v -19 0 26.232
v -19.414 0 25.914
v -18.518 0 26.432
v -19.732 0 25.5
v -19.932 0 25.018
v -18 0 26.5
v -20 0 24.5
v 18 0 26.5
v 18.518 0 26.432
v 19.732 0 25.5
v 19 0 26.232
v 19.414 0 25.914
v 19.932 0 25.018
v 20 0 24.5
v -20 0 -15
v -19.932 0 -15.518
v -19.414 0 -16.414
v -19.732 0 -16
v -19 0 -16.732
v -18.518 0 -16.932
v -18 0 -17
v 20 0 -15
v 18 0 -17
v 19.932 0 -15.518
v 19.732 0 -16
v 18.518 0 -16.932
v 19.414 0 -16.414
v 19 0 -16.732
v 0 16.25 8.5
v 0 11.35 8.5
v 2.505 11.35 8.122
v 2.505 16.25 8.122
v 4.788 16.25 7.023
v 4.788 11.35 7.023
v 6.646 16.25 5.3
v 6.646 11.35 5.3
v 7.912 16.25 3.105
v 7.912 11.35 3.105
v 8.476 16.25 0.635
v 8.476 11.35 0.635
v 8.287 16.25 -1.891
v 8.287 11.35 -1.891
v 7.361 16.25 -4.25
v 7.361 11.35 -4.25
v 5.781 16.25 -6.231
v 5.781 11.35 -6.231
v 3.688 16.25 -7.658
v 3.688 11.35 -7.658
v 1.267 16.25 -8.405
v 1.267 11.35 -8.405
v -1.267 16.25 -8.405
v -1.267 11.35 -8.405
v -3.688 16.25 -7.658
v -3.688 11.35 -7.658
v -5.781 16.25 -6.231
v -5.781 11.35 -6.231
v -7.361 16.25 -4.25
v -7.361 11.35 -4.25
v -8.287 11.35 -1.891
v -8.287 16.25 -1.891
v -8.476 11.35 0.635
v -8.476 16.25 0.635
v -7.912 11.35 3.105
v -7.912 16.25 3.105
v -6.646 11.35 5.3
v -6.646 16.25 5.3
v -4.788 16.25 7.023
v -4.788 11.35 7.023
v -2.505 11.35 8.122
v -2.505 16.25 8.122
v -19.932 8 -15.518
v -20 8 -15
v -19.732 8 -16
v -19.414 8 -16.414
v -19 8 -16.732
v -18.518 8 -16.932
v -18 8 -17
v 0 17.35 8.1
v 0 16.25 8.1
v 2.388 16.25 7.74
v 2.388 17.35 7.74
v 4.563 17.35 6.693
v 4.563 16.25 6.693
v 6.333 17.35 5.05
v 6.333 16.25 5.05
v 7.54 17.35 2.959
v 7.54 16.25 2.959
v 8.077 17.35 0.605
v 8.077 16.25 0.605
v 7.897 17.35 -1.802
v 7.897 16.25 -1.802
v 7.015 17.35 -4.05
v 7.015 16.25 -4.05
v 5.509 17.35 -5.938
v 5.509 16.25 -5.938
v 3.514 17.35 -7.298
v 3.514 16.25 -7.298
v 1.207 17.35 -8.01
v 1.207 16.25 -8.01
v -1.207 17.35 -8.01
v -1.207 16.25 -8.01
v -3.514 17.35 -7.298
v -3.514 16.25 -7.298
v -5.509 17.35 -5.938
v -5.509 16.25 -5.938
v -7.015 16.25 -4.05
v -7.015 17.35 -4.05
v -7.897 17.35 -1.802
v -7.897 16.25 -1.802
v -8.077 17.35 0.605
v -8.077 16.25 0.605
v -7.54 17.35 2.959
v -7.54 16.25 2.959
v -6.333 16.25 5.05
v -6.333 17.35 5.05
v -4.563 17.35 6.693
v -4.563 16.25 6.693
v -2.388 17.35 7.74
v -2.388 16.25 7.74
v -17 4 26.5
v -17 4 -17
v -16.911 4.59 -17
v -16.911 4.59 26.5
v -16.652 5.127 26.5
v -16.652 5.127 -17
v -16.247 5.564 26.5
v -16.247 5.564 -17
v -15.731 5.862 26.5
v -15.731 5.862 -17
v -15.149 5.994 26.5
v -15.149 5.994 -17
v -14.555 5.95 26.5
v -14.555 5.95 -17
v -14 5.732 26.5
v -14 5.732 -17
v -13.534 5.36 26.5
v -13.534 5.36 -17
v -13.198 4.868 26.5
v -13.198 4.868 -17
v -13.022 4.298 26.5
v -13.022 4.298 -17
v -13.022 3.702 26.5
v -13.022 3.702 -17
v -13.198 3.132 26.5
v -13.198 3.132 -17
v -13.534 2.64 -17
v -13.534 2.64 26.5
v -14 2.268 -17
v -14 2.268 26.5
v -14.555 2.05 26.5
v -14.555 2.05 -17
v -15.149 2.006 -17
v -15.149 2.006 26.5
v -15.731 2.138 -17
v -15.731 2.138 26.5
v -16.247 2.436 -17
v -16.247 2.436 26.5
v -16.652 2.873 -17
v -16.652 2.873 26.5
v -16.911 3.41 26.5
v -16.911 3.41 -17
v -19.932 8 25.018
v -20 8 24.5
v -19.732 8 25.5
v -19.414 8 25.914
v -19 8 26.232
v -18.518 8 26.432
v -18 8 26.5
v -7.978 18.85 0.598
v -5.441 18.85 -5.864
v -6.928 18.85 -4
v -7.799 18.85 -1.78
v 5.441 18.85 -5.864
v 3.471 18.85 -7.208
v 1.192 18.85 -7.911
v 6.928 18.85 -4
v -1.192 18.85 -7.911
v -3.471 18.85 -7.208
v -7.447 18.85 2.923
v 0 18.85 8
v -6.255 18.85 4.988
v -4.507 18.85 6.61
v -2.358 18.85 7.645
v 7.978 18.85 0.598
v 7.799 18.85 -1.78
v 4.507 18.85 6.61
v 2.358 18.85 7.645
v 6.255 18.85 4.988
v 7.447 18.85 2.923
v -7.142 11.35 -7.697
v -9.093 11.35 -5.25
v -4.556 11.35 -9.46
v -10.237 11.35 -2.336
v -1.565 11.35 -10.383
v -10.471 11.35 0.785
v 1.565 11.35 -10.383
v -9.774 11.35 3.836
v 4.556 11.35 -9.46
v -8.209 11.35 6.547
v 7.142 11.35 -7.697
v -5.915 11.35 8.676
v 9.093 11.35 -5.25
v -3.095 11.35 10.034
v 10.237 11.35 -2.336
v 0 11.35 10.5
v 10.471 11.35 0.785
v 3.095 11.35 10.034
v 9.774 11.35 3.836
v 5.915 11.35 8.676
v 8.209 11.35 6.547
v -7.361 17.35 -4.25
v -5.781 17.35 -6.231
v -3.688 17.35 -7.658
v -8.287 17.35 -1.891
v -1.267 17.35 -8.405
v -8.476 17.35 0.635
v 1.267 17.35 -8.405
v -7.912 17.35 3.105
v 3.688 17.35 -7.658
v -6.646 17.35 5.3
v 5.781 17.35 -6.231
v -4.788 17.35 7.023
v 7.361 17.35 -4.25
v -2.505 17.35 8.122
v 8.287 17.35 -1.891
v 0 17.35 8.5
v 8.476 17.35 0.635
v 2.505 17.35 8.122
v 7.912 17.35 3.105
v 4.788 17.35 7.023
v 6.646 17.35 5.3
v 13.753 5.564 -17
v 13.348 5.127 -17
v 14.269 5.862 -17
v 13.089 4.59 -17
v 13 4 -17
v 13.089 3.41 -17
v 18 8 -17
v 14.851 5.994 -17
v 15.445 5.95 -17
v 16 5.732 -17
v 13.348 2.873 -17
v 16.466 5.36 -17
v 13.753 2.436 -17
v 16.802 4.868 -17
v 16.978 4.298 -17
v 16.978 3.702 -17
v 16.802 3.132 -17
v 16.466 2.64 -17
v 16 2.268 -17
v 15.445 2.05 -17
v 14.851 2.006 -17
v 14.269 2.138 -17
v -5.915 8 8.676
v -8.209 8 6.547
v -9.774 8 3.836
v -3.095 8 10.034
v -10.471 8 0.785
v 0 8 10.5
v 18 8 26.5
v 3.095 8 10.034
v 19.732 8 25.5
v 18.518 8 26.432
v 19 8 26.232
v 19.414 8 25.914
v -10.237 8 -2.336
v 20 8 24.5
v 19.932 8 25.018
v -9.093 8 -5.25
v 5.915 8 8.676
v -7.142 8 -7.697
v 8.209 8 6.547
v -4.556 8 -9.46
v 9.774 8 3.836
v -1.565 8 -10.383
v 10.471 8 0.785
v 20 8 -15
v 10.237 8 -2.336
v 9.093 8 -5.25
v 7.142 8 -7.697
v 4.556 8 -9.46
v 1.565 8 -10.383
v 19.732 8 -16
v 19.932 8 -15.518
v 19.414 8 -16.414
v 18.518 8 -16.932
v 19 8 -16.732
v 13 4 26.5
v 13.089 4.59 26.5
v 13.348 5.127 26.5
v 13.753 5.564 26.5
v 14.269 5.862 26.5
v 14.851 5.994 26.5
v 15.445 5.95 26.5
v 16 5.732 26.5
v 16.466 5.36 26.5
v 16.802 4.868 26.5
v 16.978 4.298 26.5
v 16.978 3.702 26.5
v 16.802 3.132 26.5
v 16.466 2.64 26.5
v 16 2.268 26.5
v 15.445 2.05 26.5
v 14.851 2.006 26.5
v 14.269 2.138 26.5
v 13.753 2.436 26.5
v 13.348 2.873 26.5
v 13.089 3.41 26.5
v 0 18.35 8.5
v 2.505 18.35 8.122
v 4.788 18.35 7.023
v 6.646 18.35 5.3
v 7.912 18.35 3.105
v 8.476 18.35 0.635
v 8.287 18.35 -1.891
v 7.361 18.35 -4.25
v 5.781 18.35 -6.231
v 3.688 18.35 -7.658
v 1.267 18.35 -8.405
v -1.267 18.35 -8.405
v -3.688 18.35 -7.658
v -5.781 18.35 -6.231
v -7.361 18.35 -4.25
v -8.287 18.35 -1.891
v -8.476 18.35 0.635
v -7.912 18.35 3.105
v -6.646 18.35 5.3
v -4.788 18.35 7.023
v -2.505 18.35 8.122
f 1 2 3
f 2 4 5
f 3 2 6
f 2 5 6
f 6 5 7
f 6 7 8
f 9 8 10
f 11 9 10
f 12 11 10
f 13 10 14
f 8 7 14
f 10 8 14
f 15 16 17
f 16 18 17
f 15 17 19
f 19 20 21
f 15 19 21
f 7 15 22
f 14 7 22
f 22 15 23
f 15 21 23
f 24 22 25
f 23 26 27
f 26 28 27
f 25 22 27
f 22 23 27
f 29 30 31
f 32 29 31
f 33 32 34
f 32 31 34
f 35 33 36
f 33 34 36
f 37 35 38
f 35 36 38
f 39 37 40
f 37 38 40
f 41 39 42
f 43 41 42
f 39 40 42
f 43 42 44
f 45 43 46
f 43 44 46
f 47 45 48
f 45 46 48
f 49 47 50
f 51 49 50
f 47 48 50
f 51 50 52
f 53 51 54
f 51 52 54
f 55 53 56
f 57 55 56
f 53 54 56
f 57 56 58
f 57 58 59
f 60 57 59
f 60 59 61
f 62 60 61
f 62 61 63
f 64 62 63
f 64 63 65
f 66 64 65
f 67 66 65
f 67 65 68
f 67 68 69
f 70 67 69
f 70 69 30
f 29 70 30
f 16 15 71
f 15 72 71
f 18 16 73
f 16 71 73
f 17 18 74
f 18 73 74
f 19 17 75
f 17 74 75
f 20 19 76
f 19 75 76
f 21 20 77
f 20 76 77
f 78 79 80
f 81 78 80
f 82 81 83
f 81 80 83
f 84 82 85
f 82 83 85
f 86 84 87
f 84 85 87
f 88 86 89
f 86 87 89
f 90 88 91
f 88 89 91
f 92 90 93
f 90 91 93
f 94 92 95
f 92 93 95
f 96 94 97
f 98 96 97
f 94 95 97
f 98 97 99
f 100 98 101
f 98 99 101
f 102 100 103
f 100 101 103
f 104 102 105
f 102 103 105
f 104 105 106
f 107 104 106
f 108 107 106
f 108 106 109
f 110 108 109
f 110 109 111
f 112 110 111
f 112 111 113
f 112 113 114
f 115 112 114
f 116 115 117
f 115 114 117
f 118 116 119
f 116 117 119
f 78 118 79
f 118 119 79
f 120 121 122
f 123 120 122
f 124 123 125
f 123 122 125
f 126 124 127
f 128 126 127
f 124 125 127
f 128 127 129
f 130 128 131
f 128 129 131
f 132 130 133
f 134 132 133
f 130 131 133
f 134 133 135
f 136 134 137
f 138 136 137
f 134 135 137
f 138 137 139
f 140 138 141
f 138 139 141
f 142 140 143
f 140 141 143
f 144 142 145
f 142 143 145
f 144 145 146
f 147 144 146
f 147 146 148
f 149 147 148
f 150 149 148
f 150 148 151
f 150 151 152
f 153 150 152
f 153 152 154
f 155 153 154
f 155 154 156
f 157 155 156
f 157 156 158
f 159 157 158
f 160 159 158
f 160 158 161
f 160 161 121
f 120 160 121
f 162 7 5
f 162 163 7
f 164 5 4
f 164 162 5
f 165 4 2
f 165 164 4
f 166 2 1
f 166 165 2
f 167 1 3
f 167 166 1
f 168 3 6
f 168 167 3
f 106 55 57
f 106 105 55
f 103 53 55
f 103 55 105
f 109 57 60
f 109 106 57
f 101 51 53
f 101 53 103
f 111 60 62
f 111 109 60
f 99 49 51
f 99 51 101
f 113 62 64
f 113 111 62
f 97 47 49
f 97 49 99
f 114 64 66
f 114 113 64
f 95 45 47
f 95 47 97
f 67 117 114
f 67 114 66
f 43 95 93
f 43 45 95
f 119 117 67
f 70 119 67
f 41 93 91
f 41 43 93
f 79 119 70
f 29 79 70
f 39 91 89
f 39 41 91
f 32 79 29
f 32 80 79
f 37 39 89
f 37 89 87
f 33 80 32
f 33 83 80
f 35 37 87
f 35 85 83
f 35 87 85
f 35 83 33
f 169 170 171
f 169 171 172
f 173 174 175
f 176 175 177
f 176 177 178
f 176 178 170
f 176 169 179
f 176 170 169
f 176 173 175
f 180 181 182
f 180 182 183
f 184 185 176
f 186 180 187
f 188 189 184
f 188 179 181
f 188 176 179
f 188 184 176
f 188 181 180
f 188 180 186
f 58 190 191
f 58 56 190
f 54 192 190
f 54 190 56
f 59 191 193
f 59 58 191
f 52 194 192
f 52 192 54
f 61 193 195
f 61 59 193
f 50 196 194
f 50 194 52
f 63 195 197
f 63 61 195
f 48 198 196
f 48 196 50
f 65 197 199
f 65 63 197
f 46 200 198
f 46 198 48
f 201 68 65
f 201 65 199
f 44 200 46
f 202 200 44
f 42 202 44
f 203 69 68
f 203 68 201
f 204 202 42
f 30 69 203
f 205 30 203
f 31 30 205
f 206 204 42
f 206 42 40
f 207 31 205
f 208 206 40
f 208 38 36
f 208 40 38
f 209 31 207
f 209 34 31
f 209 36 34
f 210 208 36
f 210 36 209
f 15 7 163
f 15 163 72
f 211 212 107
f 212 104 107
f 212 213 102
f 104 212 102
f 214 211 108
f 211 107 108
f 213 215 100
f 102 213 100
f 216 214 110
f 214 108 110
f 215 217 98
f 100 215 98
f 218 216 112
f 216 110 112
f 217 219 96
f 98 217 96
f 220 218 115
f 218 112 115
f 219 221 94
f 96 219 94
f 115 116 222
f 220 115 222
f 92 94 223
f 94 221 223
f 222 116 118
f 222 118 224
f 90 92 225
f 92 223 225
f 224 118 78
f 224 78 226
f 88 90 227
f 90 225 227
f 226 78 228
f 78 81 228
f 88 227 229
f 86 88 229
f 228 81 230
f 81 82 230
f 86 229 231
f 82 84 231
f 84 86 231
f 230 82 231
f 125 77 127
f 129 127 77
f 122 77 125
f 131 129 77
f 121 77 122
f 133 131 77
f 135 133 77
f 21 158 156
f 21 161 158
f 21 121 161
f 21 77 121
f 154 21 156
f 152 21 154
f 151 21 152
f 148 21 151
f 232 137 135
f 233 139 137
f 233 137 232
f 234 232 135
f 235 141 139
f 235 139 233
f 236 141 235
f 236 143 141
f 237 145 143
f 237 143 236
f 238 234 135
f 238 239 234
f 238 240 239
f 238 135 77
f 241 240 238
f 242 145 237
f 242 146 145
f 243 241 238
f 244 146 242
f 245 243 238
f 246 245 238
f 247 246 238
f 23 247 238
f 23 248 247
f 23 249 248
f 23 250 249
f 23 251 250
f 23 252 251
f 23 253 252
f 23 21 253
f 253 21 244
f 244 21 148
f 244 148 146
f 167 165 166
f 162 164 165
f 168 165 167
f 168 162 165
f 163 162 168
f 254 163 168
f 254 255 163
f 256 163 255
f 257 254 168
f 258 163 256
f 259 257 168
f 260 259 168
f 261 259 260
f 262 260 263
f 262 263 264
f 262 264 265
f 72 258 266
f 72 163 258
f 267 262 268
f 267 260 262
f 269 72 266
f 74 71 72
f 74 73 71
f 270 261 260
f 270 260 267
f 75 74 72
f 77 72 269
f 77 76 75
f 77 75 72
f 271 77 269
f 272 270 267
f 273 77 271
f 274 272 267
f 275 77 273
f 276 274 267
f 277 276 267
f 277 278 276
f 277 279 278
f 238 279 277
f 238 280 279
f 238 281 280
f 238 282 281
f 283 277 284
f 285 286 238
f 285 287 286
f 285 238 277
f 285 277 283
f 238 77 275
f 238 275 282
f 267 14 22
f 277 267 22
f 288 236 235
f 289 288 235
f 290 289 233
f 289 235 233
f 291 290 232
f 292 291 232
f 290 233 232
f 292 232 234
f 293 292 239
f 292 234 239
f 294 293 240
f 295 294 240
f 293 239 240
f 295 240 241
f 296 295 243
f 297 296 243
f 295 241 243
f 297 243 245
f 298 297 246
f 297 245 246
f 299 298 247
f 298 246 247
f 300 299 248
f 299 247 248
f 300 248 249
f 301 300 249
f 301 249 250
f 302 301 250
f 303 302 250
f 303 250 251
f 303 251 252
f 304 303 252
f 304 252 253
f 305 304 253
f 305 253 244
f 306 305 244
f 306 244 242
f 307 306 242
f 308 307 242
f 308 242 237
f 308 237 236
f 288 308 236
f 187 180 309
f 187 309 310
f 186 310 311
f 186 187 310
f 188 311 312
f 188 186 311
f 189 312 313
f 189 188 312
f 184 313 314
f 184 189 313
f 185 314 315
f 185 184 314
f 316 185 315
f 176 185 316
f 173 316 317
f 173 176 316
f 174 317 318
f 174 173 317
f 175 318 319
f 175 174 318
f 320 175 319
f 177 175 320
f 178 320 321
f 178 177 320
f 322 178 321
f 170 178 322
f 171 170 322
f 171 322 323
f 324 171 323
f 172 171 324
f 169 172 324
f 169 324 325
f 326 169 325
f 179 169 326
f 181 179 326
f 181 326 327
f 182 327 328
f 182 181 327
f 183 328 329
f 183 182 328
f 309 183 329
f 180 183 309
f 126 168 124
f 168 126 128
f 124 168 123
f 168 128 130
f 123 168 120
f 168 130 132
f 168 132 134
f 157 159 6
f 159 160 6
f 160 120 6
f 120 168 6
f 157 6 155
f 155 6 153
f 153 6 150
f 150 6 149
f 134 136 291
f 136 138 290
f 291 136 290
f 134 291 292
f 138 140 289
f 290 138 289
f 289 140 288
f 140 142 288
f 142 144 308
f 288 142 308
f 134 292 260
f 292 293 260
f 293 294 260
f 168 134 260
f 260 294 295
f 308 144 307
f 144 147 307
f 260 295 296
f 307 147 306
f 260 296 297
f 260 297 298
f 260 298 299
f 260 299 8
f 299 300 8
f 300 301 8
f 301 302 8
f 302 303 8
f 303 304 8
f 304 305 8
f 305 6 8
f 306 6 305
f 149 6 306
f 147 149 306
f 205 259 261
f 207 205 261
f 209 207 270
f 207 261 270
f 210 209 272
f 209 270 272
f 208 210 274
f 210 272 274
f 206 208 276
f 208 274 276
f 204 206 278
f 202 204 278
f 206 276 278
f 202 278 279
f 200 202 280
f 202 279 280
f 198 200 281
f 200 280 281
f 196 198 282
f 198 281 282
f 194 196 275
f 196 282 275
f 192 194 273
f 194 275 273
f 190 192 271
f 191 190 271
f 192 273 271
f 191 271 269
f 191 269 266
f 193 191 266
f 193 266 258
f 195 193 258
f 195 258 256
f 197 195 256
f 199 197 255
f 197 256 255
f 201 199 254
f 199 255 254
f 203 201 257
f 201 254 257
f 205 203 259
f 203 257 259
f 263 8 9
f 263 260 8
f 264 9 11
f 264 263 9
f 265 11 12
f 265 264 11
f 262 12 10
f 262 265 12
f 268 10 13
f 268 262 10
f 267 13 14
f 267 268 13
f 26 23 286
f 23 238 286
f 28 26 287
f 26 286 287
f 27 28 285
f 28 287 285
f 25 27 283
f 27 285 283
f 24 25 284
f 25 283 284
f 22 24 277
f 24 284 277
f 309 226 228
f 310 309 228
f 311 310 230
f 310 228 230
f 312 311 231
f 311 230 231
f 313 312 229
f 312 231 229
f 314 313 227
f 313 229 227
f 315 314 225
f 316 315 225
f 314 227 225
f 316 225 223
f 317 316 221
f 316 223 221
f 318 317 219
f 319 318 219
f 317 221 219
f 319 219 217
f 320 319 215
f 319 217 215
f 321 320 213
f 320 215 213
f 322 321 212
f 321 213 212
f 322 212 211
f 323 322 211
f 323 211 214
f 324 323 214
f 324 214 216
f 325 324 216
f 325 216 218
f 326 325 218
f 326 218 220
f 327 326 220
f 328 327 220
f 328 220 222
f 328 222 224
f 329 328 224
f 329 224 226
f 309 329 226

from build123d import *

# Parameters (mm, degrees)
SKETCH_1_W          = 40
SKETCH_1_H          = 43.5
EXTRUDE_1_DEPTH     = 8
SKETCH_2_R          = 10.5
EXTRUDE_2_DEPTH     = 3.35
SKETCH_3_R          = 8.5
EXTRUDE_3_DEPTH     = 7.5
SKETCH_4_R          = 2
CUT_EXTRUDE_1_DEPTH = 52.454567339
CUT_EXTRUDE_START   = -1.1
SKETCH_5_R          = 8.5
SKETCH_5_R_2        = 8.1
CUT_EXTRUDE_2_DEPTH = 1.1
CHAMFER_1_SIZE      = 0.5
FILLET_1_R          = 2


with BuildPart() as part:
    # 草图1 → 凸台-拉伸1 (new body)
    with BuildSketch(Plane(origin=(0, 0, 0), x_dir=(1, 0, 0), z_dir=(0, 1, 0))):
        with Locations((0, -4.75)):
            Rectangle(SKETCH_1_W, SKETCH_1_H)
    extrude(amount=EXTRUDE_1_DEPTH)

    # 草图2 → 凸台-拉伸2 (add)
    with BuildSketch(Plane(origin=(0, 8, 0), x_dir=(1, 0, 0), z_dir=(0, 1, 0))):
        with Locations(Location((0, 0, 0), (0, 0, 270))):
            Circle(SKETCH_2_R)
    extrude(amount=EXTRUDE_2_DEPTH)

    # 草图3 → 凸台-拉伸3 (add)
    with BuildSketch(Plane(origin=(0, 11.35, 0), x_dir=(1, 0, 0), z_dir=(0, 1, 0))):
        with Locations(Location((0, 0, 0), (0, 0, 270))):
            Circle(SKETCH_3_R)
    extrude(amount=EXTRUDE_3_DEPTH)

    # 草图4 → 切除-拉伸1 (cut, through all)
    with BuildSketch(Plane(origin=(0, 0, -17), x_dir=(-1, 0, 0), z_dir=(0, 0, -1))):
        with Locations((-15, 4)):
            Circle(SKETCH_4_R)
        with Locations((15, 4)):
            Circle(SKETCH_4_R)
    extrude(amount=-CUT_EXTRUDE_1_DEPTH, mode=Mode.SUBTRACT)

    # 草图5 → 切除-拉伸2 (cut)
    with BuildSketch(Plane(origin=(0, 17.35, 0), x_dir=(1, 0, 0), z_dir=(0, 1, 0)).offset(CUT_EXTRUDE_START)):
        with Locations(Location((0, 0, 0), (0, 0, 270))):
            Circle(SKETCH_5_R)
        with Locations(Location((0, 0, 0), (0, 0, 270))):
            Circle(SKETCH_5_R_2, mode=Mode.SUBTRACT)
    extrude(amount=CUT_EXTRUDE_2_DEPTH, mode=Mode.SUBTRACT)

    # 倒角1
    chamfer_1_edges = [part.edges().sort_by_distance(p)[0] for p in [
        (0, 18.85, -8.5),
    ]]
    chamfer(chamfer_1_edges, length=CHAMFER_1_SIZE)

    # 圆角1
    fillet_1_edges = [part.edges().sort_by_distance(p)[0] for p in [
        (20, 4, 26.5),
        (-20, 4, 26.5),
        (-20, 4, -17),
        (20, 4, -17),
    ]]
    fillet(fillet_1_edges, radius=FILLET_1_R)


solid = part.part
